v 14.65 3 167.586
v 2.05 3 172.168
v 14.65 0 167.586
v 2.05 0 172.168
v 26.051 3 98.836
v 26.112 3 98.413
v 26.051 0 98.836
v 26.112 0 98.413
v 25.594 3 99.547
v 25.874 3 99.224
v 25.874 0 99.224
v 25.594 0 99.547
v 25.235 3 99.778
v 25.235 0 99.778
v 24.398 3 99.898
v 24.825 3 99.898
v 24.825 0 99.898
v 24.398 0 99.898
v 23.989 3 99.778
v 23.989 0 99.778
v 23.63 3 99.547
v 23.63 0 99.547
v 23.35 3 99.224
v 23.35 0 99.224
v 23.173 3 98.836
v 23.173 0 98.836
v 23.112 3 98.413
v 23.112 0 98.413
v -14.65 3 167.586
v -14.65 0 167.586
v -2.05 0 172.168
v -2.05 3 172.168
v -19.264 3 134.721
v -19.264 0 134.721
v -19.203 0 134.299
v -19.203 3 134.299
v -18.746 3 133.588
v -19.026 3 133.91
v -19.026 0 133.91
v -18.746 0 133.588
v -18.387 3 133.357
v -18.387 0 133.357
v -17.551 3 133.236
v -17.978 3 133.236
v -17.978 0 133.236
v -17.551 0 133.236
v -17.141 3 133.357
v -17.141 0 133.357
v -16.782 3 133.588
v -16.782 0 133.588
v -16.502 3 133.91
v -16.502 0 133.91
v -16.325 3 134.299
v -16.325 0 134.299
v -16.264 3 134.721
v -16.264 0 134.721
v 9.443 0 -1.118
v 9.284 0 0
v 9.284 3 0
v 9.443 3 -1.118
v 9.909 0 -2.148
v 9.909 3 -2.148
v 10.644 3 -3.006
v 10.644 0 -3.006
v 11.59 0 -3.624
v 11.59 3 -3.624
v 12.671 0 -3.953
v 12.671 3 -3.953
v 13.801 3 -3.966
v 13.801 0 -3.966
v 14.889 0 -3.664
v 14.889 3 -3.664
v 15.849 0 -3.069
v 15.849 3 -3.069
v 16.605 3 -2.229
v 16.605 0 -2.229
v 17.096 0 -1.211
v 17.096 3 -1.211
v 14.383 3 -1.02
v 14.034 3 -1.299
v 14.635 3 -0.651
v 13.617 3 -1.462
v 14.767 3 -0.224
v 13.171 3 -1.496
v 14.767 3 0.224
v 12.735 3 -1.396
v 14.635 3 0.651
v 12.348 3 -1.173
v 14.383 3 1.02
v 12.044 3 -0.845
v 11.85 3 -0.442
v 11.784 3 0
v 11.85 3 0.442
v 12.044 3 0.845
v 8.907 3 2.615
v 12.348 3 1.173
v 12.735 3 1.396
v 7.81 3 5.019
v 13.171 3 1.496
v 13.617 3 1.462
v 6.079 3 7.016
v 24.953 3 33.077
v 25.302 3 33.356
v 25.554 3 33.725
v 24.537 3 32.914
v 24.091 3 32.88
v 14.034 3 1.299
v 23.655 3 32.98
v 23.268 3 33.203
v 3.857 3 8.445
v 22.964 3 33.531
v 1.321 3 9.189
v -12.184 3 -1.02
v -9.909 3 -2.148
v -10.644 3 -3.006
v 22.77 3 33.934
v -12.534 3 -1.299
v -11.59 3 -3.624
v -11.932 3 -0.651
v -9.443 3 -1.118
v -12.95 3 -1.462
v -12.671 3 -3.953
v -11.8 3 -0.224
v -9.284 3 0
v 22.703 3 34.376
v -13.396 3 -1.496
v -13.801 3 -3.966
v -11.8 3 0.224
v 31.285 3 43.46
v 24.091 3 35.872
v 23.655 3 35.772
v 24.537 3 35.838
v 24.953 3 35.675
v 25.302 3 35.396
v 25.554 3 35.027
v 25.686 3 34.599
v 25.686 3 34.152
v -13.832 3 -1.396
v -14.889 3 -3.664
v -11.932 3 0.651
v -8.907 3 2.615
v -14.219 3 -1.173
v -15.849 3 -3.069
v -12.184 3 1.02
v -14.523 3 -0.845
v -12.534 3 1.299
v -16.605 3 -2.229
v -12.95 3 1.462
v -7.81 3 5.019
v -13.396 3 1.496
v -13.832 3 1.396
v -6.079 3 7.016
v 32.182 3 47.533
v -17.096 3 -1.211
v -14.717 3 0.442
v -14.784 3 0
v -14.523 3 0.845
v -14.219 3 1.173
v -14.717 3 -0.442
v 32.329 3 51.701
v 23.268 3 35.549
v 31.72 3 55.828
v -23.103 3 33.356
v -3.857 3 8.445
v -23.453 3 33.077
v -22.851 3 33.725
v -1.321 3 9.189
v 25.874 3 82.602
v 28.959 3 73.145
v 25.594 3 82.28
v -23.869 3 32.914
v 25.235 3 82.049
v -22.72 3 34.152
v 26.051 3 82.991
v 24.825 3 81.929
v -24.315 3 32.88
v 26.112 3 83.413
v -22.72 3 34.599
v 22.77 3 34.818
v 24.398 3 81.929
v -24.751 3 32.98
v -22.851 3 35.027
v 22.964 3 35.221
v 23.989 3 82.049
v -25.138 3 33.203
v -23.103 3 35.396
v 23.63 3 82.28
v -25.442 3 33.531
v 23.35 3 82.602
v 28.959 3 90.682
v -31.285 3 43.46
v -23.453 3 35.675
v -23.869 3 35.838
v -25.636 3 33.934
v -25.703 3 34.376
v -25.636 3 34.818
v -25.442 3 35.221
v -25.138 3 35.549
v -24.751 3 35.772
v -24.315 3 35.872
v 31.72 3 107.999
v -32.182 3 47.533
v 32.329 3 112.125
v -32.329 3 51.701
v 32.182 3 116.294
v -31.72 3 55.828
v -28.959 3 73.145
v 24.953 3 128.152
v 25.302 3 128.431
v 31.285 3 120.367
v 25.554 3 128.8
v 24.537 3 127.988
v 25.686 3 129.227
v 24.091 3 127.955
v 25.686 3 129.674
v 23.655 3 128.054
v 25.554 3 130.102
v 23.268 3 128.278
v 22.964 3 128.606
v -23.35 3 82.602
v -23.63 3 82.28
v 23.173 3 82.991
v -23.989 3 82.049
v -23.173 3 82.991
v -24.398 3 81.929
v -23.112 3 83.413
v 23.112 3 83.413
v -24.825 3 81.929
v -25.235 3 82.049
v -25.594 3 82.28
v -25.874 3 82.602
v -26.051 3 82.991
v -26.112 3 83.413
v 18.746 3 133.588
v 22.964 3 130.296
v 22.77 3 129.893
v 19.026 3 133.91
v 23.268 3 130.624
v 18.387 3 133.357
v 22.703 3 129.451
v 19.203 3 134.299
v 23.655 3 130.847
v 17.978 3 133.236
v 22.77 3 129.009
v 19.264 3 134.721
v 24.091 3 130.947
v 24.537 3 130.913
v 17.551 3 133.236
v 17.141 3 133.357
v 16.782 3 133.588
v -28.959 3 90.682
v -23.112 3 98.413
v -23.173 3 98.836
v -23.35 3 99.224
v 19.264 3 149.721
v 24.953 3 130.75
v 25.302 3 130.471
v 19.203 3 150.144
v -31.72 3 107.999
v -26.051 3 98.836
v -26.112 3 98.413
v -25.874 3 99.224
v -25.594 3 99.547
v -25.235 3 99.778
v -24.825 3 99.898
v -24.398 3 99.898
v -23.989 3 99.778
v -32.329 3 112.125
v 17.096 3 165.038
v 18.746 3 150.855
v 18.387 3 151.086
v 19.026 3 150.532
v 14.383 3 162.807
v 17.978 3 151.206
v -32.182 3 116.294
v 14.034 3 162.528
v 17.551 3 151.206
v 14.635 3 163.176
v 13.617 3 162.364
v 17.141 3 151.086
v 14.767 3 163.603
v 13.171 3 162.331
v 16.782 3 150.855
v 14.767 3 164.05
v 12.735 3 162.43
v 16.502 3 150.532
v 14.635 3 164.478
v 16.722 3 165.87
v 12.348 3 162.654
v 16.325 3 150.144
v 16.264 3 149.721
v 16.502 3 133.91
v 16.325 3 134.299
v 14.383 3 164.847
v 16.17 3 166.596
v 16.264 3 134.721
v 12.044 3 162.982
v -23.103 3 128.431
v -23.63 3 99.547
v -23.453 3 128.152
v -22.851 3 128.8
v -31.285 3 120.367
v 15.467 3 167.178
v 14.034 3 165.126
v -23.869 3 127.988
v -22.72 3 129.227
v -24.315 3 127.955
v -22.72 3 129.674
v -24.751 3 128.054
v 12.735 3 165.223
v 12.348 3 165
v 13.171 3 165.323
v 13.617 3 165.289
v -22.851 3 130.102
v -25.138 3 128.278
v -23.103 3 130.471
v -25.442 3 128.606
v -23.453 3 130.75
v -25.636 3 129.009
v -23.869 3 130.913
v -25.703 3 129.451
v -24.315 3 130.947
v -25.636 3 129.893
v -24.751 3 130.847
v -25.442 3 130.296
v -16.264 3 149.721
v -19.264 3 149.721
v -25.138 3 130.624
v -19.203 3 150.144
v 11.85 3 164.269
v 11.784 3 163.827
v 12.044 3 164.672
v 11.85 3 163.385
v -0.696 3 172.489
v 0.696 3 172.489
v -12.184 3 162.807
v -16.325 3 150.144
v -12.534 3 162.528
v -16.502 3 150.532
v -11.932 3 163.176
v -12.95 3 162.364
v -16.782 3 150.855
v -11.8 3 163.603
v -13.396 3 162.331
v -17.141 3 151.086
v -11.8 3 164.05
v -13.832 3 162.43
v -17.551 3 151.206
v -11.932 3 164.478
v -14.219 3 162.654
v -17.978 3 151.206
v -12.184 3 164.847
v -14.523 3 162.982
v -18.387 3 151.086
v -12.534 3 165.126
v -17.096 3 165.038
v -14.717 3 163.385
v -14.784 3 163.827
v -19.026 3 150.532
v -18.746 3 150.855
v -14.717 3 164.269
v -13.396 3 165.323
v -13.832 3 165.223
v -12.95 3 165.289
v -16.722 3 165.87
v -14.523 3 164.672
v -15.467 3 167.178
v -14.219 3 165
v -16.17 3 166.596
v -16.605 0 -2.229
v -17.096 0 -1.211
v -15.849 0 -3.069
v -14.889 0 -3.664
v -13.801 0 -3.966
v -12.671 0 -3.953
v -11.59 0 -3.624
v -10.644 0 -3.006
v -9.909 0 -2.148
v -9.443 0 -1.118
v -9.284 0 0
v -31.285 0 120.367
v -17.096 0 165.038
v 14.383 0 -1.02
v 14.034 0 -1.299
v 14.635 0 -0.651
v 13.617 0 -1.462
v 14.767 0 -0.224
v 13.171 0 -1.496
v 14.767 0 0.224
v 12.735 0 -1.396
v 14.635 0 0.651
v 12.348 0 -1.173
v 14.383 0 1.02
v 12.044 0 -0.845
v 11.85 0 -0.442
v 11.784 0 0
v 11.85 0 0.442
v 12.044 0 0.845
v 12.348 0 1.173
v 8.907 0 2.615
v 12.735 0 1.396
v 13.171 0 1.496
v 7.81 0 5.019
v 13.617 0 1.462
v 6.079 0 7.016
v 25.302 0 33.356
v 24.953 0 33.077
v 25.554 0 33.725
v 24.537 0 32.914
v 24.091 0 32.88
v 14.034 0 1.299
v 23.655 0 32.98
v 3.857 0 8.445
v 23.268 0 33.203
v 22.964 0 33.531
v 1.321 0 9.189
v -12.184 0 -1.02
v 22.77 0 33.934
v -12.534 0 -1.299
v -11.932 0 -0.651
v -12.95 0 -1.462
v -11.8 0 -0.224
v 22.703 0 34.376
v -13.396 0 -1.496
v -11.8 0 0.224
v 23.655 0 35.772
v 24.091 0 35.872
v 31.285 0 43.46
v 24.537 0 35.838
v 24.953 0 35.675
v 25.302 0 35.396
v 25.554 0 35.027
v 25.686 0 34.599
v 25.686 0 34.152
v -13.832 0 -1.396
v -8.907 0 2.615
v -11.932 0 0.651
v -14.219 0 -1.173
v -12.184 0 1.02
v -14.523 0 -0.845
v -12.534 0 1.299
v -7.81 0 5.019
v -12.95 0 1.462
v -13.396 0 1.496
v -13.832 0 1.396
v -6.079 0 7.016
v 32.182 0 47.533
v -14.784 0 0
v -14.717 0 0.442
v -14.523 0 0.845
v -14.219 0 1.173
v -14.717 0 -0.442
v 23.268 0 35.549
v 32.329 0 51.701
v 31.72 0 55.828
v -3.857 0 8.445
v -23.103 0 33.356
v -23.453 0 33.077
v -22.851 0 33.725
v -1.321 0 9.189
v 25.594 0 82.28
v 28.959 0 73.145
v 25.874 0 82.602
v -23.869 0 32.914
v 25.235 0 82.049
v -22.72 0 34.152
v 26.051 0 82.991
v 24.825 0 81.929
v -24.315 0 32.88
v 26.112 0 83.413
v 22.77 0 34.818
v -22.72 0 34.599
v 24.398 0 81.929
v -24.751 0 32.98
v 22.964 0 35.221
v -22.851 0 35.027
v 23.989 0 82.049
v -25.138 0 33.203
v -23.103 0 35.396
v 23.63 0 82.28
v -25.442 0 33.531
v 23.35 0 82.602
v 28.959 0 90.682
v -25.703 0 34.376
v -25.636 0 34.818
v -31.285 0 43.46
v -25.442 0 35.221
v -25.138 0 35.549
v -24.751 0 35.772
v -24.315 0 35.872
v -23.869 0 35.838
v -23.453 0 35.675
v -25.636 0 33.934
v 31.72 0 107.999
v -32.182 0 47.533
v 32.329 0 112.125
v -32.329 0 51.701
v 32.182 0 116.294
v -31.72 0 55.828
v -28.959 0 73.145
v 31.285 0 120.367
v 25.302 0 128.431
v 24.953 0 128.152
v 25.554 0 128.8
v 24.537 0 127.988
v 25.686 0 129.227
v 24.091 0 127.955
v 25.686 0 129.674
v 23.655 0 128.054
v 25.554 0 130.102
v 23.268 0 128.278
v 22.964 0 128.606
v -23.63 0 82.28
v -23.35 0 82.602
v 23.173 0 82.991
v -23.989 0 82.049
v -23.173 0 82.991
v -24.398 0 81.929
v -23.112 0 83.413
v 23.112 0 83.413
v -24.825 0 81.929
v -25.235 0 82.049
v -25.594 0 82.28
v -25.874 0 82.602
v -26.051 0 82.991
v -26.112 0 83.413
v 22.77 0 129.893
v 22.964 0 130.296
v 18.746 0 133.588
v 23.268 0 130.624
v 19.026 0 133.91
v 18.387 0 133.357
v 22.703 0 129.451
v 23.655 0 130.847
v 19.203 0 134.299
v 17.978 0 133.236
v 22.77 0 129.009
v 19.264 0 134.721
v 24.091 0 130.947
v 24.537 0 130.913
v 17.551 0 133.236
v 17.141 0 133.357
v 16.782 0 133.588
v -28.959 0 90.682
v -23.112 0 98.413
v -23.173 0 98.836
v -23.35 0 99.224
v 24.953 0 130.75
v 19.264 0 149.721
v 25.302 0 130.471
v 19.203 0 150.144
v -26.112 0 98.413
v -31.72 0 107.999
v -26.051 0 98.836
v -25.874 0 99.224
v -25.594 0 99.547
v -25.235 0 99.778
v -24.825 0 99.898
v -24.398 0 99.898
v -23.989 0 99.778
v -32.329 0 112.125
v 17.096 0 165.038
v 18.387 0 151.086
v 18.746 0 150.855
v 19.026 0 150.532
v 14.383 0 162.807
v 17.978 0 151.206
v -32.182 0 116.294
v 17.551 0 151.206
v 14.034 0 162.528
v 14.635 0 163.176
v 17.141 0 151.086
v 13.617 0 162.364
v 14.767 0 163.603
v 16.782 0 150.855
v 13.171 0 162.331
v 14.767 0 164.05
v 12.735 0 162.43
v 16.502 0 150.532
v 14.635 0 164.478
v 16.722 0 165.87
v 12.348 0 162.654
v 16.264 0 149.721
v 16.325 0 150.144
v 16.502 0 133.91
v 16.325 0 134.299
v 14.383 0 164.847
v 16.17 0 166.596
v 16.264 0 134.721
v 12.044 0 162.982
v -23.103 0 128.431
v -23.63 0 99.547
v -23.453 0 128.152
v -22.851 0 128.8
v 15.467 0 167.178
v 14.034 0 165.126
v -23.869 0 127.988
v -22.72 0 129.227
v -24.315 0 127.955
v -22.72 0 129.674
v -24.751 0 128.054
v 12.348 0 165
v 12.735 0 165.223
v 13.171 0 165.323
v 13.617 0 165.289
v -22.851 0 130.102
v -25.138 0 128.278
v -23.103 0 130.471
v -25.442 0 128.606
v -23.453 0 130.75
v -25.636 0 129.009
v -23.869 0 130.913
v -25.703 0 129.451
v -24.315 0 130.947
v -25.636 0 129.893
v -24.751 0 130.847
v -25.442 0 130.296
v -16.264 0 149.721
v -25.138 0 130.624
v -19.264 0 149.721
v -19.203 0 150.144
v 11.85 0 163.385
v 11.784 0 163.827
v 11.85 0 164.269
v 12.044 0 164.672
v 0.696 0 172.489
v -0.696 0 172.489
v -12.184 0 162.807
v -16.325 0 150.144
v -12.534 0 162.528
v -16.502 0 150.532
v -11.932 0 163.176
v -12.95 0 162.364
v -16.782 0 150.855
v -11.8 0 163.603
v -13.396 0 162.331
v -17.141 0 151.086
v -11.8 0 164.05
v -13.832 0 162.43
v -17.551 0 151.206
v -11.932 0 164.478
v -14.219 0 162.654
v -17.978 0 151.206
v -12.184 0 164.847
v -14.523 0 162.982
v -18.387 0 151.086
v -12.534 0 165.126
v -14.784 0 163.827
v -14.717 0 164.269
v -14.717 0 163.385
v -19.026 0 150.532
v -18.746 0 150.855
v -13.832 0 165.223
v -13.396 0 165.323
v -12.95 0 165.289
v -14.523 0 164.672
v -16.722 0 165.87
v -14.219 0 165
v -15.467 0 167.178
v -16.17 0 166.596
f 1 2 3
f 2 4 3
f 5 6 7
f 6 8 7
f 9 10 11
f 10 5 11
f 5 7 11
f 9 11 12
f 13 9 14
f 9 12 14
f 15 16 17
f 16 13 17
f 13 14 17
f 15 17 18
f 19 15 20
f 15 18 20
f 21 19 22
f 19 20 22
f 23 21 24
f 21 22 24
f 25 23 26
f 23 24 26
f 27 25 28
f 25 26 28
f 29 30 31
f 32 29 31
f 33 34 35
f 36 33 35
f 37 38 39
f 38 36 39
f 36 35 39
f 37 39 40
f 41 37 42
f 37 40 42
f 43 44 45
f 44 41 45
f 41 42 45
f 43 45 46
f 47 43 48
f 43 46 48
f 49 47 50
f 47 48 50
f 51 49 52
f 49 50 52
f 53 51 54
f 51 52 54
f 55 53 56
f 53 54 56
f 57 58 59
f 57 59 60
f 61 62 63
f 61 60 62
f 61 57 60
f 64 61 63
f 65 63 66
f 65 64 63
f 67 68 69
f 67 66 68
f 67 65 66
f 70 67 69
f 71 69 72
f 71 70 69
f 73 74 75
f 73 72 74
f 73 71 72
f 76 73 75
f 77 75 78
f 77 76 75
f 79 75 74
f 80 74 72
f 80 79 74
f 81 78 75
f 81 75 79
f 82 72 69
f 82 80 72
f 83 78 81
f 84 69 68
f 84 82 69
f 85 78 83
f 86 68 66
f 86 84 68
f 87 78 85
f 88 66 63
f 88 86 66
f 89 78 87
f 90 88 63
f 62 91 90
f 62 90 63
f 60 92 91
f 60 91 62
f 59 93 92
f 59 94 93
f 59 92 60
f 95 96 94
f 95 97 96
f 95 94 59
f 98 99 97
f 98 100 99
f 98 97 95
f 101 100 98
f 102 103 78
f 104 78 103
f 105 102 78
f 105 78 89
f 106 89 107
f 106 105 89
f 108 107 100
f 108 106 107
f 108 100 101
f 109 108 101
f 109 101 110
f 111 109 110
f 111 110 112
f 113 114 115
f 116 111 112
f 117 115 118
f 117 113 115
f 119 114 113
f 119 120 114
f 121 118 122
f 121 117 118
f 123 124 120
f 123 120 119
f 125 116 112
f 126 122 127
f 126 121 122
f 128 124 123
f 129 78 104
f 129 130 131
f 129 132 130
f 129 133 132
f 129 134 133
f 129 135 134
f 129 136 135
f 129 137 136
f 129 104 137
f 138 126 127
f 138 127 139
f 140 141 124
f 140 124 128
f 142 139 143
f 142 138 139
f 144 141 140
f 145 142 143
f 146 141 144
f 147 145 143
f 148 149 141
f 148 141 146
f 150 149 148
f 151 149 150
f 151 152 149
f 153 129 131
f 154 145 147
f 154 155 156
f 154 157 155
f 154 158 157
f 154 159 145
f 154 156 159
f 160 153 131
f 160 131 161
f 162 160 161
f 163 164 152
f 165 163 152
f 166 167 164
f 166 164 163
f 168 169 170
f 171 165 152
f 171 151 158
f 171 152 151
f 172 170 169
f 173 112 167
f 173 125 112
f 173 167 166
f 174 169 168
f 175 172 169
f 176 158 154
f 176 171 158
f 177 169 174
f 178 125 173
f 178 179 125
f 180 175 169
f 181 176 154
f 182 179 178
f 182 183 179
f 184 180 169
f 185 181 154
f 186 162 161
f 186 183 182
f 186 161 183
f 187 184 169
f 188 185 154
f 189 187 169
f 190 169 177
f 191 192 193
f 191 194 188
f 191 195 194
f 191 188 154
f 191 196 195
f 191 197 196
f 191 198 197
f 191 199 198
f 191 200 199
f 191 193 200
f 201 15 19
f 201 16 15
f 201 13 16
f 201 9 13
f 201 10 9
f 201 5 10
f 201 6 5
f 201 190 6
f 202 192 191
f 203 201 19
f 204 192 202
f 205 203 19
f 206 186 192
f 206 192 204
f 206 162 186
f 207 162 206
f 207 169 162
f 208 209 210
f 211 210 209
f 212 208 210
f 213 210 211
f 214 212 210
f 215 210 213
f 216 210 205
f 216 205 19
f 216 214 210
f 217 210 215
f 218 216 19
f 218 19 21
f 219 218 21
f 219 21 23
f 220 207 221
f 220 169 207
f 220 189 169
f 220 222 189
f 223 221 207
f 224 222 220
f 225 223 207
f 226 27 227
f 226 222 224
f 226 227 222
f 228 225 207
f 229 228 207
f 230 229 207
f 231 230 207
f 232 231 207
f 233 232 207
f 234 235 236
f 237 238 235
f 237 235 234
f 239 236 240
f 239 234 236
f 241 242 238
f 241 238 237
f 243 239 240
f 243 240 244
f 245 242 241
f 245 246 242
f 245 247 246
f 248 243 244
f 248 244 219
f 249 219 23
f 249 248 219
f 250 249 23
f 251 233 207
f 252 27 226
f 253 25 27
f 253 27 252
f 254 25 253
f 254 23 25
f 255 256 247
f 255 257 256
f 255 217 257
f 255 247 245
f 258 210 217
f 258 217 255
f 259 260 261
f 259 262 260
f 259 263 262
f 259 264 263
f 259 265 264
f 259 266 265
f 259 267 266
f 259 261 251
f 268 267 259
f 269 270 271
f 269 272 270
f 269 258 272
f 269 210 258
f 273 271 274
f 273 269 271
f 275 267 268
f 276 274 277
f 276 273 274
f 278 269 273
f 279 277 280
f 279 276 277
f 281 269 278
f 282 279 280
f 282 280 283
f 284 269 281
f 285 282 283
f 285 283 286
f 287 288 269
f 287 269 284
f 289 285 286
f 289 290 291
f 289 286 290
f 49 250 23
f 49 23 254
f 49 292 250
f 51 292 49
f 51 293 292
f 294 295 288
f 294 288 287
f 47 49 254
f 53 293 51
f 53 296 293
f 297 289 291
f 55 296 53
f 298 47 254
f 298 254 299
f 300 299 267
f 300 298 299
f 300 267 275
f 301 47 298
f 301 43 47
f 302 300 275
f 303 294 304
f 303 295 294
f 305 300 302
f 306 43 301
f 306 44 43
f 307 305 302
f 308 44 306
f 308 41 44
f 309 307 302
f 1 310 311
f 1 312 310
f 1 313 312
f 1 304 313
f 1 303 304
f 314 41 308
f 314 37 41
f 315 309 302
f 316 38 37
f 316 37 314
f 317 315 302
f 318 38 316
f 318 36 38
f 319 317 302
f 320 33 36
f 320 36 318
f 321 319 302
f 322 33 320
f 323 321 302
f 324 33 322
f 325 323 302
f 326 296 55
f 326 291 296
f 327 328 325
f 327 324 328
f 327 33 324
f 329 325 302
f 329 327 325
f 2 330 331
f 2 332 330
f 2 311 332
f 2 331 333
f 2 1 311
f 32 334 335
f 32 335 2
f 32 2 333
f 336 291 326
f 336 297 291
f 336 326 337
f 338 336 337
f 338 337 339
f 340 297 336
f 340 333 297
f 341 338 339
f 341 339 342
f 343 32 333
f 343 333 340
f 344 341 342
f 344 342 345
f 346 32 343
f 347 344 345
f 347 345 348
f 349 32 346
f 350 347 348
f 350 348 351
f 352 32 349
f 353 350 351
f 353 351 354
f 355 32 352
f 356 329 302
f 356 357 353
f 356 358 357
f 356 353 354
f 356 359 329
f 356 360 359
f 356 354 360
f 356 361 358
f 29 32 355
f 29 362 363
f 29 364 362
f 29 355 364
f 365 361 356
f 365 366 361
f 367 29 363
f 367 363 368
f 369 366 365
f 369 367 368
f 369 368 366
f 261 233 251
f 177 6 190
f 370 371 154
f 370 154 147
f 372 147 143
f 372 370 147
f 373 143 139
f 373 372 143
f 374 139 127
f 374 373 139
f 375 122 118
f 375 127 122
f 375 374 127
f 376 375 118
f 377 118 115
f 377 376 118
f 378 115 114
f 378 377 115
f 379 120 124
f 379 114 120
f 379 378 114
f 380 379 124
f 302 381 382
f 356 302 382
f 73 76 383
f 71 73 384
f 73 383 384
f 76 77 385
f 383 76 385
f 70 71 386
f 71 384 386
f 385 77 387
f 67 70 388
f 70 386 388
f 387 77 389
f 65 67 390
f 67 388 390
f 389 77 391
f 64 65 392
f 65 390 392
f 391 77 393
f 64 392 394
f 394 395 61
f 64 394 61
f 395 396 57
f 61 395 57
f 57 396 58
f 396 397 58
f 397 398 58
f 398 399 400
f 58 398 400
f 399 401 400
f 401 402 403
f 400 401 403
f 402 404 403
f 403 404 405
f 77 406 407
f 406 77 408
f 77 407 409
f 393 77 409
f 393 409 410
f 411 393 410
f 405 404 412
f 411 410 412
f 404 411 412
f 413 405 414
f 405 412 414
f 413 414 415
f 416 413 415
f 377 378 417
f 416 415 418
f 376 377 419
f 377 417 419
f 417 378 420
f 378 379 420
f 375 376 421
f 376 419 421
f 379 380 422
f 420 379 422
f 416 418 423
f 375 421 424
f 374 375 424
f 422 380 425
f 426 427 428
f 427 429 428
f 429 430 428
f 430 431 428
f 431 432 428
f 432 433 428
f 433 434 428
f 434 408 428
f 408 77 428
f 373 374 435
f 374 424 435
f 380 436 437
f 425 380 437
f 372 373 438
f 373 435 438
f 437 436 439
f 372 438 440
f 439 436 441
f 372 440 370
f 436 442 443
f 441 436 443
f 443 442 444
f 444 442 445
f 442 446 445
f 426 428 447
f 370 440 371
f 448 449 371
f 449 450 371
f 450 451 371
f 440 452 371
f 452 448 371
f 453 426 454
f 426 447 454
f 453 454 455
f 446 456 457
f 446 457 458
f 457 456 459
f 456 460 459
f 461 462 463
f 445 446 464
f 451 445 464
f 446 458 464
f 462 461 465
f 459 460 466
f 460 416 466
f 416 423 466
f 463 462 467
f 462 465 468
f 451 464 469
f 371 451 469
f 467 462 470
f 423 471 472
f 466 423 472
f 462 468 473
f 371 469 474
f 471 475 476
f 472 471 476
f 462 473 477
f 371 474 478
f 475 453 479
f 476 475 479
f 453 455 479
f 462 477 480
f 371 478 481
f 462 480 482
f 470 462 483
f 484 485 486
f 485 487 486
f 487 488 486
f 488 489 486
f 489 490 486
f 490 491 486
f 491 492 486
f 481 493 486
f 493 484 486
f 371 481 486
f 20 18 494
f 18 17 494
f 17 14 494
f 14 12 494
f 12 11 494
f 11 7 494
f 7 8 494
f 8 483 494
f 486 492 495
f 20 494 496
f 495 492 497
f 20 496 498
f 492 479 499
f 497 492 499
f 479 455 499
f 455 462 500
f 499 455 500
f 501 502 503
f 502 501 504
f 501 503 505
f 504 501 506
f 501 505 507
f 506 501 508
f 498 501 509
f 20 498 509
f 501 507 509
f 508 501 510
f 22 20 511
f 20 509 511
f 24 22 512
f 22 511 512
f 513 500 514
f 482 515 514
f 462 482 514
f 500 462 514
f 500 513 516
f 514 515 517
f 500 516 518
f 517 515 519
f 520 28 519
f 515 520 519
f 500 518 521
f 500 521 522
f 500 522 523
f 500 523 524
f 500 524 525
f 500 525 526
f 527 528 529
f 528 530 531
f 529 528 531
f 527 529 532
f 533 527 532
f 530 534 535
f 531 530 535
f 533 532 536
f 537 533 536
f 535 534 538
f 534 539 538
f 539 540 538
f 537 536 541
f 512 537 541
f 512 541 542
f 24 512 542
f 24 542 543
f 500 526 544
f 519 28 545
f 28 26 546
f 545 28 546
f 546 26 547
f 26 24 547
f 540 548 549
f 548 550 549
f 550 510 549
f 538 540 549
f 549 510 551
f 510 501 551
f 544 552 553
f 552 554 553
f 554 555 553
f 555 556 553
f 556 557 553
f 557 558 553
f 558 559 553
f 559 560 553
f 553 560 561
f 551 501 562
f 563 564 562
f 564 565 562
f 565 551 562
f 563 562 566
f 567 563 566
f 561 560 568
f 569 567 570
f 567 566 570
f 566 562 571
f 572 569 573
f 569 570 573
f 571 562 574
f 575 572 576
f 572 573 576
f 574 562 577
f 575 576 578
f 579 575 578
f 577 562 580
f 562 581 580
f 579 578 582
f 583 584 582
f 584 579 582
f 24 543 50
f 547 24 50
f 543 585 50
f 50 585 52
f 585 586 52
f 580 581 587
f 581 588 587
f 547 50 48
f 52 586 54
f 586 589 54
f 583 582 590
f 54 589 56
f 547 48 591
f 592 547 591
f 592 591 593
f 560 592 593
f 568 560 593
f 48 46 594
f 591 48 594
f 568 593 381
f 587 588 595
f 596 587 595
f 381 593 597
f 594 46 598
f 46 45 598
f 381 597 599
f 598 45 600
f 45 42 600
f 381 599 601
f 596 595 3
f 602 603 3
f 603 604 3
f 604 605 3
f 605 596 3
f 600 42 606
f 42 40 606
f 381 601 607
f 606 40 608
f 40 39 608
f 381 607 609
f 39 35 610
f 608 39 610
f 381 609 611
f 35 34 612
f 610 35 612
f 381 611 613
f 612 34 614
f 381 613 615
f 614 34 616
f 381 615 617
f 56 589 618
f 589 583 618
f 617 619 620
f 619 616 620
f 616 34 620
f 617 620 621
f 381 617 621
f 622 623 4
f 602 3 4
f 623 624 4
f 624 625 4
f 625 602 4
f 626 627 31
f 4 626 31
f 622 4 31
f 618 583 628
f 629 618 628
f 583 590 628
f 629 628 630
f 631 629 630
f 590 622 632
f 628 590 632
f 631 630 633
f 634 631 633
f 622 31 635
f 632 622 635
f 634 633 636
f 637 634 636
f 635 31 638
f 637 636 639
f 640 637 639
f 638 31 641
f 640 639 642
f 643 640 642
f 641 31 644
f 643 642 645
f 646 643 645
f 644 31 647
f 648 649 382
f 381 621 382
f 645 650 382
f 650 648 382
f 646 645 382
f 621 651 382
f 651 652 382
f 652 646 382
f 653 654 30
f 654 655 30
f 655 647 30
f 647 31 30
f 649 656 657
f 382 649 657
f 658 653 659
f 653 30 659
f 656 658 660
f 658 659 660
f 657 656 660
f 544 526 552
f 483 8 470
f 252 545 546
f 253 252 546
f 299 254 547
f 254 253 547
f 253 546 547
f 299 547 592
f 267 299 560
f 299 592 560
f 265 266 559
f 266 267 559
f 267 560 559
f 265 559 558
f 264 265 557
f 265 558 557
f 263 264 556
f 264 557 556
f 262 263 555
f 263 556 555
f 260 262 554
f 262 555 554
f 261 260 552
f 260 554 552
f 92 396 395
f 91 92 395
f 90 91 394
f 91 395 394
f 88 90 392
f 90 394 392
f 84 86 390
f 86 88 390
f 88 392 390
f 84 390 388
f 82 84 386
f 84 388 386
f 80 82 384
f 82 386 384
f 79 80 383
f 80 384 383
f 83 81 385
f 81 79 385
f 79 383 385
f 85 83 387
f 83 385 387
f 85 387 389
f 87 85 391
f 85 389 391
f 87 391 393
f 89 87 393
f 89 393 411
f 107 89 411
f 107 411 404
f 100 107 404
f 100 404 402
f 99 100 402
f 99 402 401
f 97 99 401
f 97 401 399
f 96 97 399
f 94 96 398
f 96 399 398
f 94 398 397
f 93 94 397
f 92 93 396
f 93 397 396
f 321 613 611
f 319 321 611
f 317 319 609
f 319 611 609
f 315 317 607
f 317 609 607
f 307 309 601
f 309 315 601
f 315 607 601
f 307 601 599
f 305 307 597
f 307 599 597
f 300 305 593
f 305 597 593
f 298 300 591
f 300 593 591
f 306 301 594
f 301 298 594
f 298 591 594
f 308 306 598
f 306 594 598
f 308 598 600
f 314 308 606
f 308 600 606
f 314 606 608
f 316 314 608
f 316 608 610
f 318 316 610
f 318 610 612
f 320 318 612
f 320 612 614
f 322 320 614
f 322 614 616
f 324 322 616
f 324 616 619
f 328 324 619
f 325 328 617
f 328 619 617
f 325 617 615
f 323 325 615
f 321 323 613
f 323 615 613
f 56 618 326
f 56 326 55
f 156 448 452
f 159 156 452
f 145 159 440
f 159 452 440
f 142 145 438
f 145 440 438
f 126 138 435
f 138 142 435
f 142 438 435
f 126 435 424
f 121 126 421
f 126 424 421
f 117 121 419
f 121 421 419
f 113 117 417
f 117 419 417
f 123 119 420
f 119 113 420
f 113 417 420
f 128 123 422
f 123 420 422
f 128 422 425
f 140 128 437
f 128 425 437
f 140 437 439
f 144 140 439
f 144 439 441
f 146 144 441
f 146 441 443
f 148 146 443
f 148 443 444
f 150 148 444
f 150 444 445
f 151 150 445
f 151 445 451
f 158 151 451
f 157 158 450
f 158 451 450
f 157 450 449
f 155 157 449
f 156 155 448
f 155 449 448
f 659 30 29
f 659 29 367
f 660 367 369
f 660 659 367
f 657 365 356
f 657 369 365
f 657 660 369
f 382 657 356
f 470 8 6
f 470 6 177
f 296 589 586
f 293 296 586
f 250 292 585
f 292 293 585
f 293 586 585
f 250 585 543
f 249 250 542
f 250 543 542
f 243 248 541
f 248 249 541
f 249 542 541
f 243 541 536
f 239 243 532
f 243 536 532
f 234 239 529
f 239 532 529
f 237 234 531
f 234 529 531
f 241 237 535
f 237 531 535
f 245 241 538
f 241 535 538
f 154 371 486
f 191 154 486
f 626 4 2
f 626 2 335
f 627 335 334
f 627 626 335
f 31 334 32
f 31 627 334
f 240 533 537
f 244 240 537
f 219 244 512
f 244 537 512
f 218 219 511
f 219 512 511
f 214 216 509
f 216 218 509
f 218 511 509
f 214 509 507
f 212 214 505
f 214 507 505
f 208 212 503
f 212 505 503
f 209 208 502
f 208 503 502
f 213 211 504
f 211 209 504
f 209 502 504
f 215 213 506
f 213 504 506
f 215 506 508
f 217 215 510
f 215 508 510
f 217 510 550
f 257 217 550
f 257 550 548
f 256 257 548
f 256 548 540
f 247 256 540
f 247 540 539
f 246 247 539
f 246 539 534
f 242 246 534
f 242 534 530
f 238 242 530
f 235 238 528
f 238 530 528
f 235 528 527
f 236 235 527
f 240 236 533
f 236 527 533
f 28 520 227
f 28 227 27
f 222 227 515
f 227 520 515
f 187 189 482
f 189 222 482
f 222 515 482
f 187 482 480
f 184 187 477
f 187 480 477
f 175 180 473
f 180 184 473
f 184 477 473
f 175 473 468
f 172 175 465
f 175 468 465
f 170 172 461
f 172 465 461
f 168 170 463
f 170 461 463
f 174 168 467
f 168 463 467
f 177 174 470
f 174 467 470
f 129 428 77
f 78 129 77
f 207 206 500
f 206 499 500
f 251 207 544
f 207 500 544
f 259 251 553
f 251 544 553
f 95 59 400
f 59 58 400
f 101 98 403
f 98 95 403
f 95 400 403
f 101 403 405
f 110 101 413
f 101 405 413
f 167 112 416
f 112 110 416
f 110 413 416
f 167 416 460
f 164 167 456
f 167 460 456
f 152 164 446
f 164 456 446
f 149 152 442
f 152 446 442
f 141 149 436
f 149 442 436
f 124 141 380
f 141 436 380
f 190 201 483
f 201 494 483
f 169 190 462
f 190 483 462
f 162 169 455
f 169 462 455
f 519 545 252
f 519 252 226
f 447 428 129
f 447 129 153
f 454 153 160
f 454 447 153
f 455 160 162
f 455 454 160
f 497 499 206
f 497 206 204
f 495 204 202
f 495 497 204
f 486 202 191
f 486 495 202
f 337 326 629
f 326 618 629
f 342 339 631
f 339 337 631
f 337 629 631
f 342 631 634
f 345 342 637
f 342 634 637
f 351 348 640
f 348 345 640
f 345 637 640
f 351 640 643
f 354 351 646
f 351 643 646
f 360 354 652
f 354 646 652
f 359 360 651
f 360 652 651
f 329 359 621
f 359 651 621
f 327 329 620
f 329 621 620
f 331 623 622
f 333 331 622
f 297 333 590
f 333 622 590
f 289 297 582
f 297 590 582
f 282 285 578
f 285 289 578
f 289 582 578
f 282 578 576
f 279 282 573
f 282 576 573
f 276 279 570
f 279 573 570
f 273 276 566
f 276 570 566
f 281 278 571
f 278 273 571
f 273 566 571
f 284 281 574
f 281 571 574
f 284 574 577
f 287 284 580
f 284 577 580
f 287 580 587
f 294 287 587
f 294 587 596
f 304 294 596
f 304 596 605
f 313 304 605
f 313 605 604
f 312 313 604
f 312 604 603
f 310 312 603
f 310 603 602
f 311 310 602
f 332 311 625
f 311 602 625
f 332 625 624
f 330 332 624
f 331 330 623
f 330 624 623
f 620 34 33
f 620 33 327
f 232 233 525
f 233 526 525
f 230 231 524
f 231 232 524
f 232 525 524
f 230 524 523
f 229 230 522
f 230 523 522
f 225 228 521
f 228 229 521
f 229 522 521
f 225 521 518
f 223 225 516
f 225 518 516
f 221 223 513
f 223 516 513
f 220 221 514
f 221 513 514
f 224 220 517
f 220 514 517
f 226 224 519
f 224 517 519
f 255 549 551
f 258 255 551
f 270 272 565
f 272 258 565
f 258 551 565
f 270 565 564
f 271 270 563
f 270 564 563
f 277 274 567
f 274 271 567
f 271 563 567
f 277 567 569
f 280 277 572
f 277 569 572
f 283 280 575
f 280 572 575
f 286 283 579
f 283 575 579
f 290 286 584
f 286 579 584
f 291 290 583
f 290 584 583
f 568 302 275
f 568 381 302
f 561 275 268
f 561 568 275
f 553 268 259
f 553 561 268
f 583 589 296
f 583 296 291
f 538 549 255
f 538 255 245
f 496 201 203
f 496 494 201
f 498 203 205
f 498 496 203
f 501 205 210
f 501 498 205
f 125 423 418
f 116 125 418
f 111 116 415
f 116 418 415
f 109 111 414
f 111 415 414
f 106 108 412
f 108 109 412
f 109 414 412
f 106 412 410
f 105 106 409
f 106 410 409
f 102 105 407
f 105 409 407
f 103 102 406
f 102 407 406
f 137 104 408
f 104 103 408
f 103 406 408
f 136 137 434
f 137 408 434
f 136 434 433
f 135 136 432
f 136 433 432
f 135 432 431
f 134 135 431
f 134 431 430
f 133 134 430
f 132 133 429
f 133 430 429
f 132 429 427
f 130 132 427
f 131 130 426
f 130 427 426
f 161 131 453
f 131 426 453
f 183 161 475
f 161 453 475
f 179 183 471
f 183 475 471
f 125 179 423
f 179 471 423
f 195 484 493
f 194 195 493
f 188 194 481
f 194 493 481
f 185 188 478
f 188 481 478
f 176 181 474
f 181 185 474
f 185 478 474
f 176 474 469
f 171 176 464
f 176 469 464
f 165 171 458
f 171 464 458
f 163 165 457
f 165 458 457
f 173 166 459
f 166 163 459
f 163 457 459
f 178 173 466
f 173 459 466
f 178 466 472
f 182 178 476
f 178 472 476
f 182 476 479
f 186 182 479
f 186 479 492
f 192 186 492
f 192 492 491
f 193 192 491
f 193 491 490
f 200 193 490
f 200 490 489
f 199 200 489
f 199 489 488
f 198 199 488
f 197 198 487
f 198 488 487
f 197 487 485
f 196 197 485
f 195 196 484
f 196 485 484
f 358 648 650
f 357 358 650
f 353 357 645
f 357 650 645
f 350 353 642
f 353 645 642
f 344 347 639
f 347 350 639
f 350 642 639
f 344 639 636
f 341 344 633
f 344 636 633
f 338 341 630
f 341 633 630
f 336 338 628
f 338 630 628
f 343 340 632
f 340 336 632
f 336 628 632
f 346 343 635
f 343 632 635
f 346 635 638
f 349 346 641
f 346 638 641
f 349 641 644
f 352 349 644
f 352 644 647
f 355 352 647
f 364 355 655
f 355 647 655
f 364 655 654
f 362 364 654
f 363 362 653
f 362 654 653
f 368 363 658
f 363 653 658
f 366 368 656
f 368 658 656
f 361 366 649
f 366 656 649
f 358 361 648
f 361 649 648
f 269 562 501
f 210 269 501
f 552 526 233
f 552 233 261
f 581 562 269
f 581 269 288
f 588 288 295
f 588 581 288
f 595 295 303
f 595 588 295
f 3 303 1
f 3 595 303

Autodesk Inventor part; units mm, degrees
ref_plane "YZ Plane" through (0, 0, 0) normal (1, 0, 0) x (0, 1, 0)
ref_plane "XZ Plane" through (0, 0, 0) normal (0, 1, 0) x (-1, 0, 0)
ref_plane "XY Plane" through (0, 0, 0) normal (0, 0, 1) x (1, 0, 0)
sketch "Sketch1" plane through (0, 0, 0) normal (0, 1, 0) x (-1, 0, 0)
  arc A0 (23.1118, 83.4134) -> (26.1118, 83.4134) centre (24.6118, 83.4134) ccw
  line L0 (23.1118, 98.4134) -> (23.1118, 83.4134)
  arc A1 (26.1118, 98.4134) -> (23.1118, 98.4134) centre (24.6118, 98.4134) ccw
  line L1 (26.1118, 83.4134) -> (26.1118, 98.4134)
  arc A2 (16.2641, 134.7212) -> (19.2641, 134.7212) centre (17.7641, 134.7212) ccw
  line L2 (16.2641, 149.7212) -> (16.2641, 134.7212)
  arc A3 (19.2641, 149.7212) -> (16.2641, 149.7212) centre (17.7641, 149.7212) ccw
  line L3 (19.2641, 134.7212) -> (19.2641, 149.7212)
  arc A4 (-19.2641, 134.7212) -> (-16.2641, 134.7212) centre (-17.7641, 134.7212) ccw
  line L4 (-19.2641, 149.7212) -> (-19.2641, 134.7212)
  arc A5 (-16.2641, 149.7212) -> (-19.2641, 149.7212) centre (-17.7641, 149.7212) ccw
  line L5 (-16.2641, 134.7212) -> (-16.2641, 149.7212)
  arc A6 (-26.1118, 83.4134) -> (-23.1118, 83.4134) centre (-24.6118, 83.4134) ccw
  line L6 (-26.1118, 98.4134) -> (-26.1118, 83.4134)
  arc A7 (-23.1118, 98.4134) -> (-26.1118, 98.4134) centre (-24.6118, 98.4134) ccw
  line L7 (-23.1118, 83.4134) -> (-23.1118, 98.4134)
  circle A8 centre (-24.2029, 34.3759) radius 1.5
  circle A9 centre (-13.2835, 163.8268) radius 1.5
  circle A10 centre (24.2029, 129.4508) radius 1.5
  circle A11 centre (13.2835, 0) radius 1.5
  arc A12 (-31.7205, 55.8278) -> (-31.7205, 107.999) centre (-139.6118, 81.9134) ccw
  arc A13 (-31.7205, 55.8278) -> (-31.2853, 43.4596) centre (-9.3646, 50.4227) ccw
  line L8 (-31.2853, 43.4596) -> (-17.0958, -1.211)
  arc A14 (-17.0958, -1.211) -> (-9.2835, 0) centre (-13.2835, 0) ccw
  arc A15 (9.2835, 0) -> (-9.2835, 0) centre (0, 0) ccw
  arc A16 (9.2835, 0) -> (17.0958, -1.211) centre (13.2835, 0) ccw
  line L9 (17.0958, -1.211) -> (31.2853, 43.4596)
  arc A17 (31.2853, 43.4596) -> (31.7205, 55.8278) centre (9.3646, 50.4227) ccw
  arc A18 (31.7205, 107.999) -> (31.7205, 55.8278) centre (139.6118, 81.9134) ccw
  arc A19 (31.7205, 107.999) -> (31.2853, 120.3671) centre (9.3646, 113.4041) ccw
  line L10 (31.2853, 120.3671) -> (17.0958, 165.0377)
  arc A20 (17.0958, 165.0377) -> (14.6505, 167.5859) centre (13.2835, 163.8268) ccw
  line L11 (14.6505, 167.5859) -> (2.0505, 172.1678)
  arc A21 (2.0505, 172.1678) -> (-2.0505, 172.1678) centre (0, 166.529) ccw
  line L12 (-2.0505, 172.1678) -> (-14.6505, 167.5859)
  arc A22 (-14.6505, 167.5859) -> (-17.0958, 165.0377) centre (-13.2835, 163.8268) ccw
  line L13 (-17.0958, 165.0377) -> (-31.2853, 120.3671)
  arc A23 (-31.2853, 120.3671) -> (-31.7205, 107.999) centre (-9.3646, 113.4041) ccw
  circle A24 centre (24.2029, 34.3759) radius 1.5
  circle A25 centre (13.2835, 163.8268) radius 1.5
  circle A26 centre (-24.2029, 129.4508) radius 1.5
  circle A27 centre (-13.2835, 0) radius 1.5
  point P0 (31.7205, 107.999)
  point P1 (31.2853, 120.3671)
  point P2 (17.0958, 165.0377)
  point P3 (14.6505, 167.5859)
  point P4 (-31.7205, 55.8278)
  point P5 (-31.2853, 43.4596)
  point P6 (-17.0958, -1.211)
  point P7 (-9.2835, 0)
  point P8 (9.2835, 0)
  point P9 (31.7205, 55.8278)
  point P10 (19.2641, 149.7212)
  point P11 (16.2641, 149.7212)
  point P12 (23.1118, 98.4134)
extrude "Extrusion1" add sketch "Sketch1" along normal blind 3
properties part number "399 prig top plate"
